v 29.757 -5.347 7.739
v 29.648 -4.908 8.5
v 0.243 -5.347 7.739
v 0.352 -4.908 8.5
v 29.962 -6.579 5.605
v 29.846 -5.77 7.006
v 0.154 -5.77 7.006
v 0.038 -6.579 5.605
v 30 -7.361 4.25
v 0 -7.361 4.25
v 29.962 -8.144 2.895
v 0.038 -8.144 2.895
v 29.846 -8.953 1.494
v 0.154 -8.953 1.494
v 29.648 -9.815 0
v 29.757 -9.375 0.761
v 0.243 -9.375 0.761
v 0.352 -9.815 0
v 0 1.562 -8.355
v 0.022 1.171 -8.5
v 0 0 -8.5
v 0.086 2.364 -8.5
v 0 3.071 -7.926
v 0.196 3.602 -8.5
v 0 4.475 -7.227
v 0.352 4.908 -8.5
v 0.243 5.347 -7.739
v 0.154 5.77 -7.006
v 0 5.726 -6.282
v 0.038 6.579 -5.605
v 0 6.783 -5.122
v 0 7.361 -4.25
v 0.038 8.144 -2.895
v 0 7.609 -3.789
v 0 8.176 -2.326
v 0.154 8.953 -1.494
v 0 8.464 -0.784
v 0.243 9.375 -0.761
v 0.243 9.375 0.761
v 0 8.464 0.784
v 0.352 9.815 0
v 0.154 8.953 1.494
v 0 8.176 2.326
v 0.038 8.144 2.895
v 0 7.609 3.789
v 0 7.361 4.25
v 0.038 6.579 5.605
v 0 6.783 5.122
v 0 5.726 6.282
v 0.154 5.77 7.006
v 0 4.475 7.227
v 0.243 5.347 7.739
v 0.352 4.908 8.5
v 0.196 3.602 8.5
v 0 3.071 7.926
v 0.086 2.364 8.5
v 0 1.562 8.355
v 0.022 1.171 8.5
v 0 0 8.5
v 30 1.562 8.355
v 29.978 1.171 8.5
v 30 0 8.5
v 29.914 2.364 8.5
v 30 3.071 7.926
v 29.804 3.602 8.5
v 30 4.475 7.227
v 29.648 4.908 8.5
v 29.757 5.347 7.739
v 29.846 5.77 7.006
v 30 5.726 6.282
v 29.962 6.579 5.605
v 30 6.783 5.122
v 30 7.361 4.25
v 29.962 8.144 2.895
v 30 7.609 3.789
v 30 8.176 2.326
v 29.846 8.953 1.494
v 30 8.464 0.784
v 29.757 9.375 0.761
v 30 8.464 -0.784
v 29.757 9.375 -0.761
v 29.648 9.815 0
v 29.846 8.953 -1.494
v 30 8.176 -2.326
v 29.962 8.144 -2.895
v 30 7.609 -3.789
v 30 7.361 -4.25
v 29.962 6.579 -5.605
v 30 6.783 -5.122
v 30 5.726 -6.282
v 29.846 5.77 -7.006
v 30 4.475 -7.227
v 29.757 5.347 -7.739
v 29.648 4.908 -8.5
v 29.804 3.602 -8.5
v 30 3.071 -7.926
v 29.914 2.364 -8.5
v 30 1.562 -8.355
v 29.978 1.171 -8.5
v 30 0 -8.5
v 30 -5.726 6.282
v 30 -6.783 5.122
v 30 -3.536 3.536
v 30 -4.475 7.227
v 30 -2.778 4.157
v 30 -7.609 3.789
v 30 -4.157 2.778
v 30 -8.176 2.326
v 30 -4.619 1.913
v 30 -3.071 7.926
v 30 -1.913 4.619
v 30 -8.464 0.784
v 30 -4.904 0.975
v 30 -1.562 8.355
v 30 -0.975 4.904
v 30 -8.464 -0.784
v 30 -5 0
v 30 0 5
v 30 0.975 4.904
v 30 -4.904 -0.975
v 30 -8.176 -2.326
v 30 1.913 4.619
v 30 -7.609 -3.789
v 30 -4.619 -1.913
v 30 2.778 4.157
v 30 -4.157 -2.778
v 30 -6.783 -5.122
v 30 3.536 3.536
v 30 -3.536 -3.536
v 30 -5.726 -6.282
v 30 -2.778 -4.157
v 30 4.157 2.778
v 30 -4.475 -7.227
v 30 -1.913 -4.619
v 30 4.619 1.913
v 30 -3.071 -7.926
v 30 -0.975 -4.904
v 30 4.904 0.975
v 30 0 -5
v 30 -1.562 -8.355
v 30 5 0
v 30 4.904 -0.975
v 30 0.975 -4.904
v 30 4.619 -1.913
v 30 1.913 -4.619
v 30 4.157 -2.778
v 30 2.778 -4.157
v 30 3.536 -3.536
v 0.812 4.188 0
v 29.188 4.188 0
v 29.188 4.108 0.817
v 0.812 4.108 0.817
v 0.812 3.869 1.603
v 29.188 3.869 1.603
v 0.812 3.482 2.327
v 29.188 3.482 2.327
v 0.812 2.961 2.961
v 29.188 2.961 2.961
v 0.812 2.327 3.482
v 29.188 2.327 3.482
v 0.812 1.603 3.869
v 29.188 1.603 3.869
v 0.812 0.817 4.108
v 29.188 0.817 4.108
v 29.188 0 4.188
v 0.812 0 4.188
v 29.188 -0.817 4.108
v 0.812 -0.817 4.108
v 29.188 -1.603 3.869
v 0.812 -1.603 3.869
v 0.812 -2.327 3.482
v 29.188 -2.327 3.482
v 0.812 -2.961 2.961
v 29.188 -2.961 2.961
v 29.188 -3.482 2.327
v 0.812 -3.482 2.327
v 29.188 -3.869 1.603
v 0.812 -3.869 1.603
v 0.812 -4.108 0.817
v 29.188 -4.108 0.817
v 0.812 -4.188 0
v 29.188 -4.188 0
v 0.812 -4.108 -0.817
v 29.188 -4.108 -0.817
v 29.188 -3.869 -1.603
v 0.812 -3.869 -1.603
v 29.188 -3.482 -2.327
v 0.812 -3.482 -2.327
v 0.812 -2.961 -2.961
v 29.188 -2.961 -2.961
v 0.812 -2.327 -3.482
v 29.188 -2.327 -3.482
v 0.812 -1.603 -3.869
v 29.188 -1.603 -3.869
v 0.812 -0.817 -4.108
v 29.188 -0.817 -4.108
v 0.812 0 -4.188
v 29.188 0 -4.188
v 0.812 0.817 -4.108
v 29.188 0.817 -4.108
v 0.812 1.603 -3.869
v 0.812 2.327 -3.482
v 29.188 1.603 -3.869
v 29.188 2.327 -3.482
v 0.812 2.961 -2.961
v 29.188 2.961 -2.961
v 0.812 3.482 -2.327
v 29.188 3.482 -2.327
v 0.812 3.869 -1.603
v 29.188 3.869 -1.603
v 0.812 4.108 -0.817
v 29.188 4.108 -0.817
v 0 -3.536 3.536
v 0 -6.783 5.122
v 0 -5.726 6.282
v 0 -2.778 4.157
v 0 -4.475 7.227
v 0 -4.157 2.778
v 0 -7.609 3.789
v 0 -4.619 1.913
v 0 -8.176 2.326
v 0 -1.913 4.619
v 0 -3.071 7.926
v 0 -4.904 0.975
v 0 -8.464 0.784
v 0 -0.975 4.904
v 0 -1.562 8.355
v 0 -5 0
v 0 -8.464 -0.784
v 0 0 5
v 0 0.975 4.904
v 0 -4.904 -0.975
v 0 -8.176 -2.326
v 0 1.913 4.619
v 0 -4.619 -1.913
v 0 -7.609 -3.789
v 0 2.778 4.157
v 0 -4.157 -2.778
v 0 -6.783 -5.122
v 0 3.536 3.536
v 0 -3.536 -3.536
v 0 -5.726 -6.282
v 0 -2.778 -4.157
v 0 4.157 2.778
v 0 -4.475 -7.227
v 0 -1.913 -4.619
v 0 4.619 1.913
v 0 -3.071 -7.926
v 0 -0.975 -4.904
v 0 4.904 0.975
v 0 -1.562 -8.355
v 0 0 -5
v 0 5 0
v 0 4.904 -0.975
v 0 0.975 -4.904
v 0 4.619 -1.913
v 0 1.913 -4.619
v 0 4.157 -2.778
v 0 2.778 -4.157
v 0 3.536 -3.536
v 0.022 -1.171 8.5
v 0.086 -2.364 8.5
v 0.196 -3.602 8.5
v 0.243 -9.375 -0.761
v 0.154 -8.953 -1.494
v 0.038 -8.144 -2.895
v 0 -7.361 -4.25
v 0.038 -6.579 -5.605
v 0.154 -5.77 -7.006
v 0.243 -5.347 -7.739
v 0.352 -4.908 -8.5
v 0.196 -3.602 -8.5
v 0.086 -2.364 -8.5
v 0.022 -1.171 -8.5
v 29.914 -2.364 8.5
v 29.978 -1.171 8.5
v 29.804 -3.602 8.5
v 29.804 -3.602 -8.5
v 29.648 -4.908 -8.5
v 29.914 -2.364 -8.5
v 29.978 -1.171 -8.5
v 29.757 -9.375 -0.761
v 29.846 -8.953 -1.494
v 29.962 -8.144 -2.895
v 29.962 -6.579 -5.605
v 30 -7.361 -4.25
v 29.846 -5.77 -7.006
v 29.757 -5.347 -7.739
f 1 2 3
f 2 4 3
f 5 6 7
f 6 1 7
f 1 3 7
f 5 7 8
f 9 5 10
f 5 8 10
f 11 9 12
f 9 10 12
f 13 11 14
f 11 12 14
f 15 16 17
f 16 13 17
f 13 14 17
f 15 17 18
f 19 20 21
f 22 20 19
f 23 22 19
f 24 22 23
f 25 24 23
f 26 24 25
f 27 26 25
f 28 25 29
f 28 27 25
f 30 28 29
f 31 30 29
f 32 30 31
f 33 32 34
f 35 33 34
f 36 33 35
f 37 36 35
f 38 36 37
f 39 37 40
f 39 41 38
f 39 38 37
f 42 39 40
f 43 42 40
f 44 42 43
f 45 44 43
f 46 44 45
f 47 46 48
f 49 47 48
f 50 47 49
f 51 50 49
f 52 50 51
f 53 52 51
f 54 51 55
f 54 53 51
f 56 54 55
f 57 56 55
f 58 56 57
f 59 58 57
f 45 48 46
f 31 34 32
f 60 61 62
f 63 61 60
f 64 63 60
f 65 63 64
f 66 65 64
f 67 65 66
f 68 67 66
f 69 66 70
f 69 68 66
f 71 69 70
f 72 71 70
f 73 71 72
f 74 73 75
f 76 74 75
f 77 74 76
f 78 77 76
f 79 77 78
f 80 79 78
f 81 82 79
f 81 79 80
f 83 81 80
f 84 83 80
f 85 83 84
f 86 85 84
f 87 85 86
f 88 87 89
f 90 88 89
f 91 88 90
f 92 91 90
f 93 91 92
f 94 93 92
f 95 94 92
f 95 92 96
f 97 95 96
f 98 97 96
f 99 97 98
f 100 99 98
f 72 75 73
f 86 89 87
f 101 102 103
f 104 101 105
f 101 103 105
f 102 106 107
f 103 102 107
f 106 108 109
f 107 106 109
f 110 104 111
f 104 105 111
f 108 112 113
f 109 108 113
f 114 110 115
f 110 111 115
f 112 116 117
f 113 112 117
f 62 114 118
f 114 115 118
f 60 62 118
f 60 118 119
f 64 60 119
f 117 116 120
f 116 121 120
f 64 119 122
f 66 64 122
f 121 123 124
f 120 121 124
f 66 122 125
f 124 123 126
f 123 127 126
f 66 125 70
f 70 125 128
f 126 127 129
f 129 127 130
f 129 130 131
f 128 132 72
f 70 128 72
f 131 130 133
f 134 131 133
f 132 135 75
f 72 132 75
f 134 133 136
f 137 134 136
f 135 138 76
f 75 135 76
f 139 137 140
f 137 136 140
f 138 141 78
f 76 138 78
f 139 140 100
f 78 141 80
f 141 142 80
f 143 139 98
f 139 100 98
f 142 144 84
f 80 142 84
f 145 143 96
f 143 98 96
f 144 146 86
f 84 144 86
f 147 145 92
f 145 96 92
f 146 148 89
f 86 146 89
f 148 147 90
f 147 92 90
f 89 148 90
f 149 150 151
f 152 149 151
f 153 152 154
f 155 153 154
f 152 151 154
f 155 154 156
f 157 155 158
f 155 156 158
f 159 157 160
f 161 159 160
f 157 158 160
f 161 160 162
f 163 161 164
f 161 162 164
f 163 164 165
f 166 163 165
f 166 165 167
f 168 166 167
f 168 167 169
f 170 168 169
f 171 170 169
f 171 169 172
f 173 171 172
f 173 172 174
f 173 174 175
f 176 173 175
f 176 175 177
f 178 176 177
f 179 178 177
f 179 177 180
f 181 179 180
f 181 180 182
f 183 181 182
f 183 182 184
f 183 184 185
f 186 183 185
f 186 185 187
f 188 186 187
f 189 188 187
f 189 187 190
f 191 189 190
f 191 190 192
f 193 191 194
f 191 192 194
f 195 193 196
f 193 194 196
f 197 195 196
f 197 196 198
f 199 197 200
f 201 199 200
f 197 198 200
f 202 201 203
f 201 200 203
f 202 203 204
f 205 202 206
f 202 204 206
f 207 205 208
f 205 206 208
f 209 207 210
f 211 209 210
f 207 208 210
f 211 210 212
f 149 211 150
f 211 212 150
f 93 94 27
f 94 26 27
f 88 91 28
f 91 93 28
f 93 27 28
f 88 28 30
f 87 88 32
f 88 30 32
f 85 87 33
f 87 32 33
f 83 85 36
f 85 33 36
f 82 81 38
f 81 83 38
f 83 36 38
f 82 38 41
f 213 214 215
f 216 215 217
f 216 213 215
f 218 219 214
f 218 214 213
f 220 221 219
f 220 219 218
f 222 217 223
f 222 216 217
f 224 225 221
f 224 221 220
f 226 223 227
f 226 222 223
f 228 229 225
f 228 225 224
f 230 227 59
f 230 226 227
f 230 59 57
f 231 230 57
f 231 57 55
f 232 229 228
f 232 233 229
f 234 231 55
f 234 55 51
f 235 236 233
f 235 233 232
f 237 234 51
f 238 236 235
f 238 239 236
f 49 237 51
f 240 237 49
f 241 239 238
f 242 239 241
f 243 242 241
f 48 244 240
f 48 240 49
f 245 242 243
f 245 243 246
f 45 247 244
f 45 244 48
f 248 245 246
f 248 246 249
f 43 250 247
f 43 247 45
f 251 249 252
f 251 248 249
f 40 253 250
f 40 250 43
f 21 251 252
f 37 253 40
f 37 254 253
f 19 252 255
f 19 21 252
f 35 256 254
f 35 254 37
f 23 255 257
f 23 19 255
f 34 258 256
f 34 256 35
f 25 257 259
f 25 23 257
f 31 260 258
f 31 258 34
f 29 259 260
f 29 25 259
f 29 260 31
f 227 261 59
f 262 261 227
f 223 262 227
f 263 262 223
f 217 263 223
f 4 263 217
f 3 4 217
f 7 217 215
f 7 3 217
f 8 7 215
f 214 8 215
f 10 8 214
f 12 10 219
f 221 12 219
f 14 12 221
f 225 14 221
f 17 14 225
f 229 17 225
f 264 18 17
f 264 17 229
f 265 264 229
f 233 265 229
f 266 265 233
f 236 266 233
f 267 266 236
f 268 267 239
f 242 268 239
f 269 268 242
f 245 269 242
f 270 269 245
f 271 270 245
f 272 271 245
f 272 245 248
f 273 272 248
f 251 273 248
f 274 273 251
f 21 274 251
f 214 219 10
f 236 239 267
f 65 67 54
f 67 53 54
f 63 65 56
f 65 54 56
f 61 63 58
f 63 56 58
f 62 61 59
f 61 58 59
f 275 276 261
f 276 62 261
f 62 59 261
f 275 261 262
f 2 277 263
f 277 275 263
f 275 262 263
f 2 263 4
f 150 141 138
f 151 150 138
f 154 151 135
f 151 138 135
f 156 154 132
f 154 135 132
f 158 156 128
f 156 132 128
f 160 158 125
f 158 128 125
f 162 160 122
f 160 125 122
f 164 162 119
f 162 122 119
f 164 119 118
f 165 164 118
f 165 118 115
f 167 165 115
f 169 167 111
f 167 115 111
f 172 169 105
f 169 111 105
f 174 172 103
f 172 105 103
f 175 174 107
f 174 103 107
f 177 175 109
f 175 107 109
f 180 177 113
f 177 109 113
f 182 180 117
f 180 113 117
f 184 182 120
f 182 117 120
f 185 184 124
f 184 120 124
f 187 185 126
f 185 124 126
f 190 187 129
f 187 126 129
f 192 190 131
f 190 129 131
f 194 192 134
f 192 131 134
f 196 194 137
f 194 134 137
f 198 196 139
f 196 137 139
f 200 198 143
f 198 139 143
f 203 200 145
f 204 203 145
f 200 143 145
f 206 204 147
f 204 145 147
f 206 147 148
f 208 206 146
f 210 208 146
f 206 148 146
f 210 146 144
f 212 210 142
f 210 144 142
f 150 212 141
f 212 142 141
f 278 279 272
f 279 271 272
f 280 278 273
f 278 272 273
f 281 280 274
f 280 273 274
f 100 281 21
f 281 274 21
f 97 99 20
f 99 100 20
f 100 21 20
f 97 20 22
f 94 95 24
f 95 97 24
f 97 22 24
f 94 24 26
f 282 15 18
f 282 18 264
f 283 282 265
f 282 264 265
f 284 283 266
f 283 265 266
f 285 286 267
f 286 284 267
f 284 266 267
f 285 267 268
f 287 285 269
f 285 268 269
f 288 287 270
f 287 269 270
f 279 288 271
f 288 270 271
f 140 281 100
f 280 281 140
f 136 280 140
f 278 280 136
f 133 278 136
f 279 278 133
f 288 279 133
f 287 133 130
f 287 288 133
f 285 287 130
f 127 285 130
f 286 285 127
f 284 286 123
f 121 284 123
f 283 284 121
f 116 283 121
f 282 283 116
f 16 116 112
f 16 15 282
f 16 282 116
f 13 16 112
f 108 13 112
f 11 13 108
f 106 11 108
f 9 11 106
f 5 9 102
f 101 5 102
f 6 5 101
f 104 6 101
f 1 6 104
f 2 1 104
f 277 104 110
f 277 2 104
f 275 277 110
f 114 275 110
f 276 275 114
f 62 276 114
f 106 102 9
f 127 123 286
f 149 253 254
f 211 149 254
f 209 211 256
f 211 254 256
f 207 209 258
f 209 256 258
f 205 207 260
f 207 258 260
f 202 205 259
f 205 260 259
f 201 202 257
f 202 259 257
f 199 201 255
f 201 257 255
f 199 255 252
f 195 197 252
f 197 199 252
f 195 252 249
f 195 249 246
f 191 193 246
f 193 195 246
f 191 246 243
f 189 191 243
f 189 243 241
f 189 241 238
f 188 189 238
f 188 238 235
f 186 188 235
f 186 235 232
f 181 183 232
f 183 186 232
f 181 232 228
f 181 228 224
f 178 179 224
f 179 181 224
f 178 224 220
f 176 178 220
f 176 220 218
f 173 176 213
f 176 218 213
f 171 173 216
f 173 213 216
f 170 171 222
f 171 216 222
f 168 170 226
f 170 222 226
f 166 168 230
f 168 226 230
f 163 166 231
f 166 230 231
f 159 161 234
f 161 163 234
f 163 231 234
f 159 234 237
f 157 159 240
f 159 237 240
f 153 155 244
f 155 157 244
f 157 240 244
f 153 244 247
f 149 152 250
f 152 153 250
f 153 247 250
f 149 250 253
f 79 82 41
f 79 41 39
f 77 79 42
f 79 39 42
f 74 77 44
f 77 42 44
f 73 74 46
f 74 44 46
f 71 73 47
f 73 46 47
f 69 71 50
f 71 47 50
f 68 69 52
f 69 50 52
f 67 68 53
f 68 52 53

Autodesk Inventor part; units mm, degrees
sketch "Sketch_1" plane through (0, 0, 0) normal (0, 0, 1) x (1, 0, 0)
  line L0 (30, 0) -> (0, 0)
  line L1 (0, 0) -> (0, 10.2)
  line L2 (0, 10.2) -> (30, 10.2)
  line L3 (30, 10.2) -> (30, 0)
  line L4 (30, 0) -> (0, 0)
revolve "Revolution1" add sketch "Sketch_1" angle 360 about axis through (30, 0, 0) along (-1, 0, 0)
sketch "Sketch_4" plane through (0, 0, 0) normal (0, 0, 1) x (1, 0, 0)
  line L0 (30, 0) -> (0, 0)
  line L1 (0, 8.5) -> (0.4555, 10.2)
  line L2 (0.4555, 10.2) -> (0, 10.2)
  line L3 (0, 10.2) -> (0, 8.5)
revolve "Revolution2" cut sketch "Sketch_4" angle 360 about axis through (30, 0, 0) along (1, 0, 0)
sketch "Sketch_5" plane through (0, 0, 0) normal (0, 0, 1) x (1, 0, 0)
  line L0 (30, 0) -> (0, 0)
  line L1 (29.5445, 10.2) -> (30, 8.5)
  line L2 (30, 8.5) -> (30, 10.2)
  line L3 (30, 10.2) -> (29.5445, 10.2)
revolve "Revolution3" cut sketch "Sketch_5" angle 360 about axis through (30, 0, 0) along (1, 0, 0)
sketch "Sketch_3" plane through (0, 0, 0) normal (0, 0, 1) x (1, 0, 0)
  line L0 (30, 0) -> (0, 0)
  line L1 (0, 0) -> (0, 5)
  line L2 (0, 5) -> (0.812, 4.188)
  line L3 (0.812, 4.188) -> (29.188, 4.188)
  line L4 (29.188, 4.188) -> (30, 5)
  line L5 (30, 5) -> (30, 0)
  line L6 (30, 0) -> (0, 0)
revolve "Revolution4" cut sketch "Sketch_3" angle 360 about axis through (30, 0, 0) along (1, 0, 0)
thread "Thread1" size "M10x1.5" class "6H" standard "ISO Metric profile" full length
sketch "Sketch_2" plane through (0, 0, 0) normal (1, 0, 0) x (0, 1, 0)
  line L0 (34, 34) -> (-34, 34)
  line L1 (-34, 34) -> (-34, -34)
  line L2 (-34, -34) -> (34, -34)
  line L3 (34, -34) -> (34, 34)
  line L4 (-4.9075, 8.5) -> (-9.815, 0)
  line L5 (-9.815, 0) -> (-4.9075, -8.5)
  line L6 (-4.9075, -8.5) -> (4.9075, -8.5)
  line L7 (4.9075, -8.5) -> (9.815, 0)
  line L8 (9.815, 0) -> (4.9075, 8.5)
  line L9 (4.9075, 8.5) -> (-4.9075, 8.5)
extrude "Extrusion1" cut sketch "Sketch_2" along normal mid plane 62
ref_plane "IP1_XY" through (0, 0, 0) normal (1, 0, 0) x (0, 0, -1)
ref_plane "IP1_YZ" through (0, 0, 0) normal (0, 0, -1) x (0, 1, 0)
ref_plane "IP1_ZX" through (0, 0, 0) normal (0, 1, 0) x (1, 0, 0)
ref_plane "IP2_XY" through (30, 0, 0) normal (1, 0, 0) x (0, 0, -1)
ref_plane "IP2_YZ" through (30, 0, 0) normal (0, 0, -1) x (0, 1, 0)
ref_plane "IP2_ZX" through (30, 0, 0) normal (0, 1, 0) x (1, 0, 0)
properties part number "Hexagon nut DIN 6334 M10 51103.100.040(High)"
